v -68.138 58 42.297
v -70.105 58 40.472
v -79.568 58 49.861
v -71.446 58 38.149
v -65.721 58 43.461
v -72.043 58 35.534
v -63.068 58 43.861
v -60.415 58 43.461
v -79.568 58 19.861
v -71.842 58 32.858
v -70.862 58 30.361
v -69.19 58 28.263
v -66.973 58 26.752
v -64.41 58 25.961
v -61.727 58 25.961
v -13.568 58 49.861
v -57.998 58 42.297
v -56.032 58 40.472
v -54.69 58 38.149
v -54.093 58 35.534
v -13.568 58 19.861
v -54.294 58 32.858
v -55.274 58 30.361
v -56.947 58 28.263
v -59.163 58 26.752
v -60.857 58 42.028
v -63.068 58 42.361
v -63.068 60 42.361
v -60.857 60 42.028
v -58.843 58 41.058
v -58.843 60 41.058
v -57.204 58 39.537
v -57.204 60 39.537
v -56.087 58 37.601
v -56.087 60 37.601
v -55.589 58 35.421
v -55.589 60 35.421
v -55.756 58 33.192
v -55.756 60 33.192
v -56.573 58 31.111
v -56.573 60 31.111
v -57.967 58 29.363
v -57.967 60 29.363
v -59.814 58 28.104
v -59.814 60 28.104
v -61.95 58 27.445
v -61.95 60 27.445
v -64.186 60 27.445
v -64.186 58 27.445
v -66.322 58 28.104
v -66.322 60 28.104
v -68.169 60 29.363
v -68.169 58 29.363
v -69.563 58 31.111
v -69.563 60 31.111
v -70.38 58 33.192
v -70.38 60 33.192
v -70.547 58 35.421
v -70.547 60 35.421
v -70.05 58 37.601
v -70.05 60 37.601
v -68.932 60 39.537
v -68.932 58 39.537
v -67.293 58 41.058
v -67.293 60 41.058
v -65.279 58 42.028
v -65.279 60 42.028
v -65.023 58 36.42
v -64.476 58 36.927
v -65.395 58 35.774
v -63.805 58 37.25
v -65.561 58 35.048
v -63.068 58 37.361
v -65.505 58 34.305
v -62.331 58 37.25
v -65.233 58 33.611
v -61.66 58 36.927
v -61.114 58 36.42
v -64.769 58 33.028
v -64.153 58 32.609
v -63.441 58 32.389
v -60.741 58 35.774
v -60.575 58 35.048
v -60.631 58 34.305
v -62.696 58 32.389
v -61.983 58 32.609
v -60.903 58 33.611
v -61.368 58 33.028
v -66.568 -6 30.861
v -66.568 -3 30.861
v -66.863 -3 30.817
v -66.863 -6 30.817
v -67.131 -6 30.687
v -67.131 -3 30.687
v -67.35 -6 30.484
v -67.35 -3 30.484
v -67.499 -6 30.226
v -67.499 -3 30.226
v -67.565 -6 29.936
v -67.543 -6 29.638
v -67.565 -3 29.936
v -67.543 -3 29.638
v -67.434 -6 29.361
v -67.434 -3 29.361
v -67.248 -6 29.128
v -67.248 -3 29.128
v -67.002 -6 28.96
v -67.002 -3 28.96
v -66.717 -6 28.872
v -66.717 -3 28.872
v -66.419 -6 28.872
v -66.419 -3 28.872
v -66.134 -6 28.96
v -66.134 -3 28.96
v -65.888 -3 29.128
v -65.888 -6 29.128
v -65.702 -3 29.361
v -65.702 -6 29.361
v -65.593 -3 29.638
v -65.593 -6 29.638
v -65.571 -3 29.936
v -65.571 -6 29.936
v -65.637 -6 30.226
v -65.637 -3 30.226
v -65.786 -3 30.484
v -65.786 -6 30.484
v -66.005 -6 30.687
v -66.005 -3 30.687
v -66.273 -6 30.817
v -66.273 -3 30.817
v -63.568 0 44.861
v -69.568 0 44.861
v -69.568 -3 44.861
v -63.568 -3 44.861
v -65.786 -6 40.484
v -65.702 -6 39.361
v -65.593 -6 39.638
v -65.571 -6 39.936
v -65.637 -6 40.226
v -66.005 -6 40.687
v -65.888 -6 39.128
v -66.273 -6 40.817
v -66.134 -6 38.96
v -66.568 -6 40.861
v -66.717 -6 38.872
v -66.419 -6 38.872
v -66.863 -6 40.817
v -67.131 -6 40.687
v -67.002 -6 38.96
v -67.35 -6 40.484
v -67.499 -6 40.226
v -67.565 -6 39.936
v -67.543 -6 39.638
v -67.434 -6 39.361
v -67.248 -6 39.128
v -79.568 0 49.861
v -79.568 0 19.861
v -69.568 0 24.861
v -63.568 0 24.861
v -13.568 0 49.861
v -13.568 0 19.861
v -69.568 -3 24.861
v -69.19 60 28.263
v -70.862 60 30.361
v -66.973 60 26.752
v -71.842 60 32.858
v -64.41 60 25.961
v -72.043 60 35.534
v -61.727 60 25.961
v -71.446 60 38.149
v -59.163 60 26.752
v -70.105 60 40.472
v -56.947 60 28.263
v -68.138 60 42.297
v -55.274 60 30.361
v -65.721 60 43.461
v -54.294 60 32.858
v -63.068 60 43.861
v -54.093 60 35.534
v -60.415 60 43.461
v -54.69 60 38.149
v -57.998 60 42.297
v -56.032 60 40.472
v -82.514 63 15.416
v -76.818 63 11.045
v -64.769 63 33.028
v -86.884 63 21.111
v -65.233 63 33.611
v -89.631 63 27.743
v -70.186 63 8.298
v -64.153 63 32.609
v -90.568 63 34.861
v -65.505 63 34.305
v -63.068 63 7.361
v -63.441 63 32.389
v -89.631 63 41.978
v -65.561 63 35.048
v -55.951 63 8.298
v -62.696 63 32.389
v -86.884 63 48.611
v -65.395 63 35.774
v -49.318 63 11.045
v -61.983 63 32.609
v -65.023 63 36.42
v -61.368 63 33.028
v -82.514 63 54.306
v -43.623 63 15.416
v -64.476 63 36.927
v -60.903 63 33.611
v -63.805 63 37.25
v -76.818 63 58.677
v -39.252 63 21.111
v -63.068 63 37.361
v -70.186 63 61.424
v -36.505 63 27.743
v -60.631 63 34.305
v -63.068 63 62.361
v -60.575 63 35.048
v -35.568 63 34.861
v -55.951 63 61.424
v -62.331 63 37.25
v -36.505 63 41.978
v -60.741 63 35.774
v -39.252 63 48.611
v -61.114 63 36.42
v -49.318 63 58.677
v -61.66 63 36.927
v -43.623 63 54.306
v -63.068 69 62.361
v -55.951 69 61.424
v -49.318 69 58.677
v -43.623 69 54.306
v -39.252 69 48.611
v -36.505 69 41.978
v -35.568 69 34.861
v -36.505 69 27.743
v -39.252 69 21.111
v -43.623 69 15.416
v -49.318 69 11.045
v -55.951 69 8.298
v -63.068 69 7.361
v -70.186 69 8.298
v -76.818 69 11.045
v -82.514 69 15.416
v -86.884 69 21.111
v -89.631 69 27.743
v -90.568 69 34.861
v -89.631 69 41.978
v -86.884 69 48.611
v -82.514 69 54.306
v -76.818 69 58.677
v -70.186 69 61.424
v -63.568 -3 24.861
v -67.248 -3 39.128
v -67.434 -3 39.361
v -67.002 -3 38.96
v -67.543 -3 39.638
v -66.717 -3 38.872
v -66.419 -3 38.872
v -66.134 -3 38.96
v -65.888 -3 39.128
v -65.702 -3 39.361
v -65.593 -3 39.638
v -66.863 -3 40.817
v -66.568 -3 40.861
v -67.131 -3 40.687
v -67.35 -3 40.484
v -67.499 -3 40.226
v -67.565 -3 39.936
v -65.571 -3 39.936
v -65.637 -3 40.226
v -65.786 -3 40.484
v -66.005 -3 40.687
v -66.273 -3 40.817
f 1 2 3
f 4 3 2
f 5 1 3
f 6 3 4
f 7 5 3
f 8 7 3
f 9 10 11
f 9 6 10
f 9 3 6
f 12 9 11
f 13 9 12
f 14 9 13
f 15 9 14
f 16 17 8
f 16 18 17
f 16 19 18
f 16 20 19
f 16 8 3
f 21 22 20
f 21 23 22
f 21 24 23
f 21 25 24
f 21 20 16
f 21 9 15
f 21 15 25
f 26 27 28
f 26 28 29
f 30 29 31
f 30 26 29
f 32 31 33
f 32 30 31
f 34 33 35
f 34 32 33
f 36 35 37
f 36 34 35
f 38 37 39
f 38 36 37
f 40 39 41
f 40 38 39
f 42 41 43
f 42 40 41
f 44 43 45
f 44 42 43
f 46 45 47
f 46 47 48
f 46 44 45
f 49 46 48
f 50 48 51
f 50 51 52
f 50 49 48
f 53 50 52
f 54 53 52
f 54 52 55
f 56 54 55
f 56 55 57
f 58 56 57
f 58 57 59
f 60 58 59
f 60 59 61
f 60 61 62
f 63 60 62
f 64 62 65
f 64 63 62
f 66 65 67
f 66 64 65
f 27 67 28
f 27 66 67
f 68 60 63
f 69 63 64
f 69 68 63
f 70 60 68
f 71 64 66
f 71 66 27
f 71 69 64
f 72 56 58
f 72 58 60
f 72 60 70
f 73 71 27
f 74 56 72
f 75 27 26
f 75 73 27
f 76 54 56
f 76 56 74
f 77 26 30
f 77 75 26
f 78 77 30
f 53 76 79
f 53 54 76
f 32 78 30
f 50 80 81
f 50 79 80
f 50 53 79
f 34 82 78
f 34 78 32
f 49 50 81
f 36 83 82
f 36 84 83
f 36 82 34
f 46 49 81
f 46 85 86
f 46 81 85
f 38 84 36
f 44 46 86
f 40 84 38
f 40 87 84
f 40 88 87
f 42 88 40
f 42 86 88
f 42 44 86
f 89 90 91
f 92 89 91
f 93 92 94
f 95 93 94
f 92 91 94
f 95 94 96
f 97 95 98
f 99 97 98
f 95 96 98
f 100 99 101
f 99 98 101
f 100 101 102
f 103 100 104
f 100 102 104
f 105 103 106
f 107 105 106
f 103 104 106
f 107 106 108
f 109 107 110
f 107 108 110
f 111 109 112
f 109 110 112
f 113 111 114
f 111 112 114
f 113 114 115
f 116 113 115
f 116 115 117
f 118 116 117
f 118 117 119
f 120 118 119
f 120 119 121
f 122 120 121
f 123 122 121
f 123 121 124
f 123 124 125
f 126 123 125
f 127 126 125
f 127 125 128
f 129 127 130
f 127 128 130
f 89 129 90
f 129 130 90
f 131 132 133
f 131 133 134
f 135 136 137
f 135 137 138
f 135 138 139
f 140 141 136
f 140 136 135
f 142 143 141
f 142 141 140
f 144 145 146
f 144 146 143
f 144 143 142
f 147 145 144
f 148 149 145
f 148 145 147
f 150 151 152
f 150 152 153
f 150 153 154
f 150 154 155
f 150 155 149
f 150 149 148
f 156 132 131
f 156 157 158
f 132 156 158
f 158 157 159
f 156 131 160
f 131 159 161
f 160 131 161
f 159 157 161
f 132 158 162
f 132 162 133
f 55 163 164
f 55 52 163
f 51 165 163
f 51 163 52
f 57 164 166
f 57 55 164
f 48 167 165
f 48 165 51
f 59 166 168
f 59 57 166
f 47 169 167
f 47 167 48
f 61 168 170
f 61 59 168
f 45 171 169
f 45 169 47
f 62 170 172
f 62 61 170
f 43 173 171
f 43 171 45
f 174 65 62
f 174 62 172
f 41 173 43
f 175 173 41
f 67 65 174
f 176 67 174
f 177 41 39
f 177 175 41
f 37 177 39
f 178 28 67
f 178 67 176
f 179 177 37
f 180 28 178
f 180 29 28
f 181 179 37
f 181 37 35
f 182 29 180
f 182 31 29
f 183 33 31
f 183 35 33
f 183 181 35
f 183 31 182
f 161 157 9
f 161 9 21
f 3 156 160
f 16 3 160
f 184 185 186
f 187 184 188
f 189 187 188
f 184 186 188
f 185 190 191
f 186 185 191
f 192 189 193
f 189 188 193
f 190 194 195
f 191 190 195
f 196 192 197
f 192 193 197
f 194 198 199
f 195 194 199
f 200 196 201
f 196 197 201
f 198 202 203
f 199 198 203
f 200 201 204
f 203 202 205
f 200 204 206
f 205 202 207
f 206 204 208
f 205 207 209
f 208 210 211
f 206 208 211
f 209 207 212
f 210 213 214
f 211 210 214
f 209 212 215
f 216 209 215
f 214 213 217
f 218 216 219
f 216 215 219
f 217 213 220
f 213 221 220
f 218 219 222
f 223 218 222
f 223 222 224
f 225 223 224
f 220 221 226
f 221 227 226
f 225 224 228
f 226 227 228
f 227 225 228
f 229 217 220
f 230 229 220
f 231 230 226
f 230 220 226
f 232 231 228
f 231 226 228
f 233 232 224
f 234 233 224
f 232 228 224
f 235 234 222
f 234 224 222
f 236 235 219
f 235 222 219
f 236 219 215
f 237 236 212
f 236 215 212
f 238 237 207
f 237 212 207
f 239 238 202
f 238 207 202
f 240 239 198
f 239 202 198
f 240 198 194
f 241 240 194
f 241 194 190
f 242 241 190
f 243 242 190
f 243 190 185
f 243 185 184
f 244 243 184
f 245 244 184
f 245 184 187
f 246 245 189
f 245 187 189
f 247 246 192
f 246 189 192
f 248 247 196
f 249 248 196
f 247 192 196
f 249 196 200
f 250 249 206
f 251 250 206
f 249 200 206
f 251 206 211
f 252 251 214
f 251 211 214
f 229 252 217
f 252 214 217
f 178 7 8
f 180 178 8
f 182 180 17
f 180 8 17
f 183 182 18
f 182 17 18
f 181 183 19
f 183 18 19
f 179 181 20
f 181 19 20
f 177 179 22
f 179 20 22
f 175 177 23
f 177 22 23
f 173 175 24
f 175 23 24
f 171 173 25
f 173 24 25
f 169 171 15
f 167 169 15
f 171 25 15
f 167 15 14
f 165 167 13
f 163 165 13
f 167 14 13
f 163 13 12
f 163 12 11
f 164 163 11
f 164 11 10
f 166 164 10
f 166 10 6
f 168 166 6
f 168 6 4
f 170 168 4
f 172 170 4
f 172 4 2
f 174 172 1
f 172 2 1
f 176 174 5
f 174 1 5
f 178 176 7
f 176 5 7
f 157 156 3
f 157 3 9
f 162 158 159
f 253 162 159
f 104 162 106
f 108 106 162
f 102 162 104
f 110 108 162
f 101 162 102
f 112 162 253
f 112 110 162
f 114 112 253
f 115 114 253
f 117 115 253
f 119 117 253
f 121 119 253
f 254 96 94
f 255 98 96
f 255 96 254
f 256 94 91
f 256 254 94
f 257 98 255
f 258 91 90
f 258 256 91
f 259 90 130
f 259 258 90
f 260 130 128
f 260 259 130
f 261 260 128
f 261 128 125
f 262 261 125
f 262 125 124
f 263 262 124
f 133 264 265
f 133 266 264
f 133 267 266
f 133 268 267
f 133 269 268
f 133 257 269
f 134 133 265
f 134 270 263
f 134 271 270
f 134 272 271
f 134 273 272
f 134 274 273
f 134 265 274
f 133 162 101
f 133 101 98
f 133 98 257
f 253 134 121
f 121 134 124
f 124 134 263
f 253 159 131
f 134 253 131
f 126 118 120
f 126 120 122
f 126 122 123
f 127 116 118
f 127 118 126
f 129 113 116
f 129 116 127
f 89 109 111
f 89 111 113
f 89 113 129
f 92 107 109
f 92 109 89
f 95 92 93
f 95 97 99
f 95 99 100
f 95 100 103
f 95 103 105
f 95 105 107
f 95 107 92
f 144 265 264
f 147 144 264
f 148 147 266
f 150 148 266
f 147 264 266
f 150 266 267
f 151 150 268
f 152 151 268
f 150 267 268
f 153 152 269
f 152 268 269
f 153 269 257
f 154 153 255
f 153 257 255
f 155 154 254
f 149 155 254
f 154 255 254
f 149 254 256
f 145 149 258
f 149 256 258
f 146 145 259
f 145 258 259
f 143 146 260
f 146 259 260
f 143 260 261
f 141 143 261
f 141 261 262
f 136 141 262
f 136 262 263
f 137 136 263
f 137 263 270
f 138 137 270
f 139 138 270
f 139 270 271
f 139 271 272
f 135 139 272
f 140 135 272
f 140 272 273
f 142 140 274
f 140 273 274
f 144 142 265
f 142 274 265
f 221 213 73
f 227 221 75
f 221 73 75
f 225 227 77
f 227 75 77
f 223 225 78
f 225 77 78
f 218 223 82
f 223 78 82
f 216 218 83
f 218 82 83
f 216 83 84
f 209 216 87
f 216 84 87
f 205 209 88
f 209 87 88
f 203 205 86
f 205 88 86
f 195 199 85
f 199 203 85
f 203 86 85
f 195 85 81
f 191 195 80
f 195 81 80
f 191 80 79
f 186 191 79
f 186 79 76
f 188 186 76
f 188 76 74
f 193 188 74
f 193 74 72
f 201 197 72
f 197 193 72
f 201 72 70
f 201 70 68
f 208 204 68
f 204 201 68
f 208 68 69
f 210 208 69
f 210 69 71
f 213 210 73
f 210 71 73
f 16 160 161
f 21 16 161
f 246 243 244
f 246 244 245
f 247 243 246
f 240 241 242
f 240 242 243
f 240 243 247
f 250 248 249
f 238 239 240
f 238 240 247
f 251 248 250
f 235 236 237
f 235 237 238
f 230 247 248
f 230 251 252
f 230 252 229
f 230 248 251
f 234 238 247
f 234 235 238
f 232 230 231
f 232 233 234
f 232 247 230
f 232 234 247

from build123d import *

# Parameters (mm, degrees)
SKETCH2_W                = 66
SKETCH2_H                = 30
BOSS_EXTRUDE1_DEPTH      = 58
SKETCH3_R                = 9
SKETCH3_R_2              = 7.5
BOSS_EXTRUDE2_DEPTH      = 2
SKETCH4_R                = 2.5
BOSS_EXTRUDE3_DEPTH      = 10
BOSS_EXTRUDE4_DEPTH      = 1
BOSS_EXTRUDE4_DEPTH_BACK = 5
SKETCH5_R                = 27.5
SKETCH6_W                = 6
SKETCH6_H                = 20
BOSS_EXTRUDE5_DEPTH      = 3
SKETCH7_R                = 1
BOSS_EXTRUDE6_DEPTH      = 3


with BuildPart() as part:
    # Sketch2 → Boss-Extrude1 (new body)
    with BuildSketch(Plane(origin=(0, 0, 0), x_dir=(1, 0, 0), z_dir=(0, 1, 0))):
        with Locations((-46.568123526, -34.860945828)):
            Rectangle(SKETCH2_W, SKETCH2_H)
    extrude(amount=BOSS_EXTRUDE1_DEPTH)

    # Sketch3 → Boss-Extrude2 (add)
    with BuildSketch(Plane(origin=(0, 58, 0), x_dir=(1, 0, 0), z_dir=(0, 1, 0))):
        with Locations(Location((-63.068123526, -34.860945828, 0), (0, 0, 270))):
            Circle(SKETCH3_R)
        with Locations(Location((-63.068123526, -34.860945828, 0), (0, 0, 270))):
            Circle(SKETCH3_R_2, mode=Mode.SUBTRACT)
    extrude(amount=BOSS_EXTRUDE2_DEPTH)

    # Sketch4 → Boss-Extrude3 (add)
    with BuildSketch(Plane(origin=(0, 58, 0), x_dir=(1, 0, 0), z_dir=(0, 1, 0))):
        with Locations(Location((-63.068123526, -34.860945828, 0), (0, 0, 270))):
            Circle(SKETCH4_R)
    extrude(amount=BOSS_EXTRUDE3_DEPTH)

    # Sketch5 → Boss-Extrude4 (add, two sides: drawn at the far end of the back side and taken through both)
    with BuildSketch(Plane(origin=(0, 68, 0), x_dir=(1, 0, 0), z_dir=(0, 1, 0)).offset(-BOSS_EXTRUDE4_DEPTH_BACK)):
        with Locations(Location((-63.068123526, -34.860945828, 0), (0, 0, 270))):
            Circle(SKETCH5_R)
    extrude(amount=BOSS_EXTRUDE4_DEPTH + BOSS_EXTRUDE4_DEPTH_BACK)

    # Sketch6 → Boss-Extrude5 (add)
    with BuildSketch(Plane.XZ):
        with Locations((-66.568123526, 34.860945828)):
            Rectangle(SKETCH6_W, SKETCH6_H)
    extrude(amount=BOSS_EXTRUDE5_DEPTH)

    # Sketch7 → Boss-Extrude6 (add)
    with BuildSketch(Plane.XZ.offset(3)):
        with Locations(Location((-66.568123526, 29.860945828, 0), (0, 0, 90))):
            Circle(SKETCH7_R)
        with Locations(Location((-66.568123526, 39.860945828, 0), (0, 0, 90))):
            Circle(SKETCH7_R)
    extrude(amount=BOSS_EXTRUDE6_DEPTH)


solid = part.part
